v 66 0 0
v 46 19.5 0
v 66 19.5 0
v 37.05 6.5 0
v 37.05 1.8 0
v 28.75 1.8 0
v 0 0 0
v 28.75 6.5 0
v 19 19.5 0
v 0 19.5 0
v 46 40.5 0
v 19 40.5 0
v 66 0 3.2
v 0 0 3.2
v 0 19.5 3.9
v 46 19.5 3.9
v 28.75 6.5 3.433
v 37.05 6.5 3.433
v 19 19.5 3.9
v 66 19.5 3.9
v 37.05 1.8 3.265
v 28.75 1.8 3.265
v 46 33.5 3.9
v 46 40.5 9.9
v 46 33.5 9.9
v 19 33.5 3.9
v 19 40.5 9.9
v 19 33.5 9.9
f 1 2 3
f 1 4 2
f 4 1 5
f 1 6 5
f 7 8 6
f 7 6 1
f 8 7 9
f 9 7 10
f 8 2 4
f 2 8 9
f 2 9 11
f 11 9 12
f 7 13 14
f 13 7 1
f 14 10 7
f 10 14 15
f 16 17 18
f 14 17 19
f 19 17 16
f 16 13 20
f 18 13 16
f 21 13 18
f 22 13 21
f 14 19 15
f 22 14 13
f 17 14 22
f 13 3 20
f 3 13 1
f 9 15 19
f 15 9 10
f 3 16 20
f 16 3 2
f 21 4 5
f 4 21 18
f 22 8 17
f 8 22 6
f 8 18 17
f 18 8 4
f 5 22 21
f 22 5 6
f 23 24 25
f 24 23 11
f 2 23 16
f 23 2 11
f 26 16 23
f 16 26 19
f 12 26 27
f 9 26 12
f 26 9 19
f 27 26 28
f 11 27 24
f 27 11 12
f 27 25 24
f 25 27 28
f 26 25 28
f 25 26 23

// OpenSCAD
w=66;
d=19.5;
h1=3.2;
h2=3.9;

dingspoints = [
    [0,0,0], [w,0,0], [w,d,0], [0,d,0],
    [0,0,h1], [w,0,h1], [w,d,h2], [0,d,h2]
];

dingsfaces = [
  [0,1,2,3],  // bottom
  [4,5,1,0],  // front
  [7,6,5,4],  // top
  [5,6,2,1],  // right
  [6,7,3,2],  // back
  [7,4,0,3]   // left
];

difference() {
    // Stor firkant
    polyhedron( dingspoints, dingsfaces );
    // Høl
    translate([28.75,1.8,0])
        cube([8.3,4.7,3.9]);
}

// Lås
translate([19,19.5,0]) {
    cube([27,21,3.9]);
    translate([0,14,3.9]) {
        cube([27,7,6]);
    }
}
